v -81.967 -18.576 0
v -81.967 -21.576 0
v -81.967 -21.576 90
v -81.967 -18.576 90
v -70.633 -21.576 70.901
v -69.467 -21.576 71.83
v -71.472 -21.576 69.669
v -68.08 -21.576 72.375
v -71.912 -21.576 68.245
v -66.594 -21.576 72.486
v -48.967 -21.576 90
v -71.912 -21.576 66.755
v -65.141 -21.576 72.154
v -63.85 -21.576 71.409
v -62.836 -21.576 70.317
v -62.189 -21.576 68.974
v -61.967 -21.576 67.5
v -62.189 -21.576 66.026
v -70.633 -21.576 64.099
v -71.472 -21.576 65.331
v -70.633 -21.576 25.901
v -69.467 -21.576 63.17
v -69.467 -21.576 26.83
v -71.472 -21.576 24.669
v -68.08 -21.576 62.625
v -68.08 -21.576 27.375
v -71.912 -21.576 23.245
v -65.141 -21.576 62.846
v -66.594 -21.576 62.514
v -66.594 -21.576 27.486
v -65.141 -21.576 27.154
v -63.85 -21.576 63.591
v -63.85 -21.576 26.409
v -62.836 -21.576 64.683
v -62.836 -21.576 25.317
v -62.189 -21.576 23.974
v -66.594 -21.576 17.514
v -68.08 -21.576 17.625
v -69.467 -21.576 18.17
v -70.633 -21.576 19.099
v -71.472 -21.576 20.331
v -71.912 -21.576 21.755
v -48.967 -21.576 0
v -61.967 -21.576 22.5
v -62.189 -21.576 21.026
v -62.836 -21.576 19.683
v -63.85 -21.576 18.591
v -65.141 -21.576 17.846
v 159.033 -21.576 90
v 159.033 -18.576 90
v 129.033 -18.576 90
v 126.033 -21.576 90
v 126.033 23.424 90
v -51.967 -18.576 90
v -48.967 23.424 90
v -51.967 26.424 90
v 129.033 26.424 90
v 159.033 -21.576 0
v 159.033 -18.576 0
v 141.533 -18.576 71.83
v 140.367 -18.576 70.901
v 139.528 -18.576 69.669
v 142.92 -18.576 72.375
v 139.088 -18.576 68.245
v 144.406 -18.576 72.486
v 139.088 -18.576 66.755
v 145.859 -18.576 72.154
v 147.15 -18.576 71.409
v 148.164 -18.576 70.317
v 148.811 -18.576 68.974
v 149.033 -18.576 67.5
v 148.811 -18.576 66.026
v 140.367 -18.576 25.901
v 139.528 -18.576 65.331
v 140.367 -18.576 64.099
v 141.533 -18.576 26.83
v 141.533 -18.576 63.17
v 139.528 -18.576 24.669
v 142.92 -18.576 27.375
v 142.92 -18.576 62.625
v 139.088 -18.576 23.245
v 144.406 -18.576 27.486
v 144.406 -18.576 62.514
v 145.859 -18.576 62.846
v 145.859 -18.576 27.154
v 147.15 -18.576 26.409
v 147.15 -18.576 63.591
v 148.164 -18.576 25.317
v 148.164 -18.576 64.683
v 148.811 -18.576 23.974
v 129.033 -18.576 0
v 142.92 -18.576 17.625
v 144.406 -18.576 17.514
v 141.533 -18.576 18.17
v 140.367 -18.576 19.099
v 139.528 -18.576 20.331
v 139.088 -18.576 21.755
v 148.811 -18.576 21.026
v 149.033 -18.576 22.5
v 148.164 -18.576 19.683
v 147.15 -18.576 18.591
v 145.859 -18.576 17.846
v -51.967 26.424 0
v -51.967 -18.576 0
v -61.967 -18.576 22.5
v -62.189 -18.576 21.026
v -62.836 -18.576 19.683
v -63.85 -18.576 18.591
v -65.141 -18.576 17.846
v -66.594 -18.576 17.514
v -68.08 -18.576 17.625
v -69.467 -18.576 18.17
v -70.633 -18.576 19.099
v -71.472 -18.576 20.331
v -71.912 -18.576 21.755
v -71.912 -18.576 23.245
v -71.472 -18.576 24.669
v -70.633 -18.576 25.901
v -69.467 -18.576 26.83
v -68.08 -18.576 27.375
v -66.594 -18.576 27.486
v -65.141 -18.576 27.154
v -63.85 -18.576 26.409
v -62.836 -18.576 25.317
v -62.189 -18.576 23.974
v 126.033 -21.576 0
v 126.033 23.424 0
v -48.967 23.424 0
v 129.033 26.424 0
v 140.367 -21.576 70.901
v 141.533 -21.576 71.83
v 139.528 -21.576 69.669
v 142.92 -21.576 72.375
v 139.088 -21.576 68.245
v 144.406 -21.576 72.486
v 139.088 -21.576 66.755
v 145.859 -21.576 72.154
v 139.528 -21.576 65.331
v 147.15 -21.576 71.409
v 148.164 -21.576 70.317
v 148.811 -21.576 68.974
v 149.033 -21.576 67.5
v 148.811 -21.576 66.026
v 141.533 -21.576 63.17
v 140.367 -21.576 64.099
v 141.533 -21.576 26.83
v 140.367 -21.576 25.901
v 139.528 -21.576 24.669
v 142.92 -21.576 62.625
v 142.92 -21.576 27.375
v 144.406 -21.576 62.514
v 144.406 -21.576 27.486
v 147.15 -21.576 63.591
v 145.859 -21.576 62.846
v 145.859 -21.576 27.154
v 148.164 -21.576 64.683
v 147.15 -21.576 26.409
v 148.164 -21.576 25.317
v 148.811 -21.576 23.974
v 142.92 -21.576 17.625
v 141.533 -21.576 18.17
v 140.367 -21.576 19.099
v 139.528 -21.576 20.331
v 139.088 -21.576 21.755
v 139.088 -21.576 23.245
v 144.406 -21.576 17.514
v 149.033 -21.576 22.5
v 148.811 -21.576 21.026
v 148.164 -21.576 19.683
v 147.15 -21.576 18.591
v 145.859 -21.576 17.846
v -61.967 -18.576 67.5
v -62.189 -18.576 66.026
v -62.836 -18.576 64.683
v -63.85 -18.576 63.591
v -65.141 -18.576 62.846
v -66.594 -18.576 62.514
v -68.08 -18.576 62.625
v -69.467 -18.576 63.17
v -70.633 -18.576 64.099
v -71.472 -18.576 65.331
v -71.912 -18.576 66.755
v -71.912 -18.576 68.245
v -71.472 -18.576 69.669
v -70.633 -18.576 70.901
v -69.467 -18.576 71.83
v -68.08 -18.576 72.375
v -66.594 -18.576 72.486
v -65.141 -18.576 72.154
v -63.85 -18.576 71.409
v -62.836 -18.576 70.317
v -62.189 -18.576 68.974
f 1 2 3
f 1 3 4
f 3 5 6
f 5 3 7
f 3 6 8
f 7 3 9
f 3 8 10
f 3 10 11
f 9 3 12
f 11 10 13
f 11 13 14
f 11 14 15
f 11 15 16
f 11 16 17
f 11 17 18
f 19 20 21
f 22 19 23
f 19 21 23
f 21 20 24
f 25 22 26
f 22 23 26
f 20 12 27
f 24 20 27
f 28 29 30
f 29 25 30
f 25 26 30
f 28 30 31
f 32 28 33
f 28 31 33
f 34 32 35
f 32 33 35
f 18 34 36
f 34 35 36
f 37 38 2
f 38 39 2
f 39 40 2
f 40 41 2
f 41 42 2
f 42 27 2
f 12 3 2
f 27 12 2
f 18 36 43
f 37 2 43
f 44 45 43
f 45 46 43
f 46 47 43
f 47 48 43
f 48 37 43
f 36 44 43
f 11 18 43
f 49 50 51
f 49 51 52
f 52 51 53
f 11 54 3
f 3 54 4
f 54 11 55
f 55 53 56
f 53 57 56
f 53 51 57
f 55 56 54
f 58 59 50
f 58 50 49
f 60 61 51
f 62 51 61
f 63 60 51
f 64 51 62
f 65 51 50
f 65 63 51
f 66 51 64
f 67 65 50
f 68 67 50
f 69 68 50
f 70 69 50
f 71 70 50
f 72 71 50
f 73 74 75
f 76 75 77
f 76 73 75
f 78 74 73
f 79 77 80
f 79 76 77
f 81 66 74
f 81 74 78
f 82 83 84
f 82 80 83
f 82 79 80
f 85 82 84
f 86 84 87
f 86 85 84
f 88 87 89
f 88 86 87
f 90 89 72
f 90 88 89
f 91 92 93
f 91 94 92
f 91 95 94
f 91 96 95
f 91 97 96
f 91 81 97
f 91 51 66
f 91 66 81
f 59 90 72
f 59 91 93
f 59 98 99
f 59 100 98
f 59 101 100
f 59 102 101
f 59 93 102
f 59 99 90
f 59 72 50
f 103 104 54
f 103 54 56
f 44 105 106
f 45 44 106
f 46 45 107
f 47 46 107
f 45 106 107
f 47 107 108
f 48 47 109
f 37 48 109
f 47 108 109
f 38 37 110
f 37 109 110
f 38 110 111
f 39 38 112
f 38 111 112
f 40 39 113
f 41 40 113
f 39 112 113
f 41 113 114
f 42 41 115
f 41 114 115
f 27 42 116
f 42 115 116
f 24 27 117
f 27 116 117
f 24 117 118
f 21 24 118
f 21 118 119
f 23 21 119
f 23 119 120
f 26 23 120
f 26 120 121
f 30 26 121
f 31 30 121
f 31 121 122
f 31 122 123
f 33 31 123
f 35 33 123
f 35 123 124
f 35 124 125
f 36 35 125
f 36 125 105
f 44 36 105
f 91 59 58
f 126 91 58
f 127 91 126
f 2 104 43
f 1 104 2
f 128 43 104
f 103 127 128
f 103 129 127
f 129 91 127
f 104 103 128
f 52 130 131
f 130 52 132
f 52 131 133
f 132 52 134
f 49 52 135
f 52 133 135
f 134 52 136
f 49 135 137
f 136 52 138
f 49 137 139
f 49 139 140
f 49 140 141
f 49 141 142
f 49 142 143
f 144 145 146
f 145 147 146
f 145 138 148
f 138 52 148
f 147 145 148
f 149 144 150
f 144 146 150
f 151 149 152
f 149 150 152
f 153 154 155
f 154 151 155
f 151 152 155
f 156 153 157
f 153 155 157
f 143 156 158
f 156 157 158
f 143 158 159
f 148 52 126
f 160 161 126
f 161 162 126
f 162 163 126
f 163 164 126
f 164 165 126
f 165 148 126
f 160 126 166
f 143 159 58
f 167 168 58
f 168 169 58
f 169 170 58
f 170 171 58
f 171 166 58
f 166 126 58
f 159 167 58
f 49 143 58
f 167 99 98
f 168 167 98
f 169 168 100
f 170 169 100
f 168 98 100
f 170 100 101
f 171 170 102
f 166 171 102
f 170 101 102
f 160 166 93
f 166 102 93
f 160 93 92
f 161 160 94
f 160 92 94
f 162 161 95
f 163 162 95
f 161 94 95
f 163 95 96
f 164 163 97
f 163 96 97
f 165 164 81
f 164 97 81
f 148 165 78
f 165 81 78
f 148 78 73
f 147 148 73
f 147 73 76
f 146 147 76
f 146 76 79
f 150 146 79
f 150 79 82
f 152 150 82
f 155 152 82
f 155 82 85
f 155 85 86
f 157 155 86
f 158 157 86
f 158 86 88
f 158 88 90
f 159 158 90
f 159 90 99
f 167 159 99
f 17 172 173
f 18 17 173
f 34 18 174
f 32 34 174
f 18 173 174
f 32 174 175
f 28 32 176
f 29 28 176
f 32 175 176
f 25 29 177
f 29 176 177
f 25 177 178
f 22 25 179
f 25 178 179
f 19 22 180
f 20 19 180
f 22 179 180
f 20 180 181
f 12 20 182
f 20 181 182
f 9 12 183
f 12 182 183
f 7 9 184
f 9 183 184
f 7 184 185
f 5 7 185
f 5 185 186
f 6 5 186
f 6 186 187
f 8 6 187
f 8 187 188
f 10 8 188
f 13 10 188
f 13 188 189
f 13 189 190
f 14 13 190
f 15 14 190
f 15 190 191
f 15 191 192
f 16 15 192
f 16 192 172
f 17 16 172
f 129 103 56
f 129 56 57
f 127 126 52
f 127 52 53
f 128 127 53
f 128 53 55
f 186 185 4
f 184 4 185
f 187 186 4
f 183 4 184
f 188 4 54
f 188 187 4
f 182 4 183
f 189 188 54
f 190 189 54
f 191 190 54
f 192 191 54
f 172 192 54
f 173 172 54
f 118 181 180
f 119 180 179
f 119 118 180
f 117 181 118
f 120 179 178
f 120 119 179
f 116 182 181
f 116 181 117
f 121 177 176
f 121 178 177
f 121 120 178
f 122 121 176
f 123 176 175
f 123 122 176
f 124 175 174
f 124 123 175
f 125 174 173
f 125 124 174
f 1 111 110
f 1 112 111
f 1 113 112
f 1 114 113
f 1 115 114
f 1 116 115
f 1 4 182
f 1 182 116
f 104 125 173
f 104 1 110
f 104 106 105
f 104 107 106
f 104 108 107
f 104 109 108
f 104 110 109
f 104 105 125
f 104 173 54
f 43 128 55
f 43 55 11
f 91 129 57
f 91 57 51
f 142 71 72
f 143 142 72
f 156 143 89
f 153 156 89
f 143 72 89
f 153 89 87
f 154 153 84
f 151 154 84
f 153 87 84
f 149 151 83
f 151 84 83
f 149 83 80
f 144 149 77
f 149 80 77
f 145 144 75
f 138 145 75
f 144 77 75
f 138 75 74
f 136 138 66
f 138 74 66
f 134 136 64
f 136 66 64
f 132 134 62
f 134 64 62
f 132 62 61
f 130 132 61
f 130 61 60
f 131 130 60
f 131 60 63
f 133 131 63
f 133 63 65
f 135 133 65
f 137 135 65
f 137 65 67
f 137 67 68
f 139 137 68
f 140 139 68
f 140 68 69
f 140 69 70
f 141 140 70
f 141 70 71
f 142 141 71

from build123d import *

# Parameters (mm, degrees)
BOSS_EXTRUDE1_DEPTH = 90
SKETCH2_R           = 5
CUT_EXTRUDE1_DEPTH  = 90


with BuildPart() as part:
    # Sketch1 → Boss-Extrude1 (new body)
    with BuildSketch(Plane.XY):
        Polygon((-51.967349513, 26.424347916), (129.032650487, 26.424347916), (129.032650487, -18.575652084), (159.032650487, -18.575652084), (159.032650487, -21.575652084), (129.032650487, -21.575652084), (126.032650487, -21.575652084), (126.032650487, 23.424347916), (-48.967349513, 23.424347916), (-48.967349513, -21.575652084), (-51.967349513, -21.575652084), (-81.967349513, -21.575652084), (-81.967349513, -18.575652084), (-51.967349513, -18.575652084), align=None)
    extrude(amount=BOSS_EXTRUDE1_DEPTH)

    # Sketch2 → Cut-Extrude1 (cut)
    with BuildSketch(Plane(origin=(0, -18.575652084, 0), x_dir=(1, 0, 0), z_dir=(0, 1, 0))):
        with Locations((144.032650487, -22.5)):
            Circle(SKETCH2_R)
        with Locations((144.032650487, -67.5)):
            Circle(SKETCH2_R)
        with Locations((-66.967349513, -67.5)):
            Circle(SKETCH2_R)
        with Locations((-66.967349513, -22.5)):
            Circle(SKETCH2_R)
    extrude(amount=-CUT_EXTRUDE1_DEPTH, mode=Mode.SUBTRACT)


solid = part.part
